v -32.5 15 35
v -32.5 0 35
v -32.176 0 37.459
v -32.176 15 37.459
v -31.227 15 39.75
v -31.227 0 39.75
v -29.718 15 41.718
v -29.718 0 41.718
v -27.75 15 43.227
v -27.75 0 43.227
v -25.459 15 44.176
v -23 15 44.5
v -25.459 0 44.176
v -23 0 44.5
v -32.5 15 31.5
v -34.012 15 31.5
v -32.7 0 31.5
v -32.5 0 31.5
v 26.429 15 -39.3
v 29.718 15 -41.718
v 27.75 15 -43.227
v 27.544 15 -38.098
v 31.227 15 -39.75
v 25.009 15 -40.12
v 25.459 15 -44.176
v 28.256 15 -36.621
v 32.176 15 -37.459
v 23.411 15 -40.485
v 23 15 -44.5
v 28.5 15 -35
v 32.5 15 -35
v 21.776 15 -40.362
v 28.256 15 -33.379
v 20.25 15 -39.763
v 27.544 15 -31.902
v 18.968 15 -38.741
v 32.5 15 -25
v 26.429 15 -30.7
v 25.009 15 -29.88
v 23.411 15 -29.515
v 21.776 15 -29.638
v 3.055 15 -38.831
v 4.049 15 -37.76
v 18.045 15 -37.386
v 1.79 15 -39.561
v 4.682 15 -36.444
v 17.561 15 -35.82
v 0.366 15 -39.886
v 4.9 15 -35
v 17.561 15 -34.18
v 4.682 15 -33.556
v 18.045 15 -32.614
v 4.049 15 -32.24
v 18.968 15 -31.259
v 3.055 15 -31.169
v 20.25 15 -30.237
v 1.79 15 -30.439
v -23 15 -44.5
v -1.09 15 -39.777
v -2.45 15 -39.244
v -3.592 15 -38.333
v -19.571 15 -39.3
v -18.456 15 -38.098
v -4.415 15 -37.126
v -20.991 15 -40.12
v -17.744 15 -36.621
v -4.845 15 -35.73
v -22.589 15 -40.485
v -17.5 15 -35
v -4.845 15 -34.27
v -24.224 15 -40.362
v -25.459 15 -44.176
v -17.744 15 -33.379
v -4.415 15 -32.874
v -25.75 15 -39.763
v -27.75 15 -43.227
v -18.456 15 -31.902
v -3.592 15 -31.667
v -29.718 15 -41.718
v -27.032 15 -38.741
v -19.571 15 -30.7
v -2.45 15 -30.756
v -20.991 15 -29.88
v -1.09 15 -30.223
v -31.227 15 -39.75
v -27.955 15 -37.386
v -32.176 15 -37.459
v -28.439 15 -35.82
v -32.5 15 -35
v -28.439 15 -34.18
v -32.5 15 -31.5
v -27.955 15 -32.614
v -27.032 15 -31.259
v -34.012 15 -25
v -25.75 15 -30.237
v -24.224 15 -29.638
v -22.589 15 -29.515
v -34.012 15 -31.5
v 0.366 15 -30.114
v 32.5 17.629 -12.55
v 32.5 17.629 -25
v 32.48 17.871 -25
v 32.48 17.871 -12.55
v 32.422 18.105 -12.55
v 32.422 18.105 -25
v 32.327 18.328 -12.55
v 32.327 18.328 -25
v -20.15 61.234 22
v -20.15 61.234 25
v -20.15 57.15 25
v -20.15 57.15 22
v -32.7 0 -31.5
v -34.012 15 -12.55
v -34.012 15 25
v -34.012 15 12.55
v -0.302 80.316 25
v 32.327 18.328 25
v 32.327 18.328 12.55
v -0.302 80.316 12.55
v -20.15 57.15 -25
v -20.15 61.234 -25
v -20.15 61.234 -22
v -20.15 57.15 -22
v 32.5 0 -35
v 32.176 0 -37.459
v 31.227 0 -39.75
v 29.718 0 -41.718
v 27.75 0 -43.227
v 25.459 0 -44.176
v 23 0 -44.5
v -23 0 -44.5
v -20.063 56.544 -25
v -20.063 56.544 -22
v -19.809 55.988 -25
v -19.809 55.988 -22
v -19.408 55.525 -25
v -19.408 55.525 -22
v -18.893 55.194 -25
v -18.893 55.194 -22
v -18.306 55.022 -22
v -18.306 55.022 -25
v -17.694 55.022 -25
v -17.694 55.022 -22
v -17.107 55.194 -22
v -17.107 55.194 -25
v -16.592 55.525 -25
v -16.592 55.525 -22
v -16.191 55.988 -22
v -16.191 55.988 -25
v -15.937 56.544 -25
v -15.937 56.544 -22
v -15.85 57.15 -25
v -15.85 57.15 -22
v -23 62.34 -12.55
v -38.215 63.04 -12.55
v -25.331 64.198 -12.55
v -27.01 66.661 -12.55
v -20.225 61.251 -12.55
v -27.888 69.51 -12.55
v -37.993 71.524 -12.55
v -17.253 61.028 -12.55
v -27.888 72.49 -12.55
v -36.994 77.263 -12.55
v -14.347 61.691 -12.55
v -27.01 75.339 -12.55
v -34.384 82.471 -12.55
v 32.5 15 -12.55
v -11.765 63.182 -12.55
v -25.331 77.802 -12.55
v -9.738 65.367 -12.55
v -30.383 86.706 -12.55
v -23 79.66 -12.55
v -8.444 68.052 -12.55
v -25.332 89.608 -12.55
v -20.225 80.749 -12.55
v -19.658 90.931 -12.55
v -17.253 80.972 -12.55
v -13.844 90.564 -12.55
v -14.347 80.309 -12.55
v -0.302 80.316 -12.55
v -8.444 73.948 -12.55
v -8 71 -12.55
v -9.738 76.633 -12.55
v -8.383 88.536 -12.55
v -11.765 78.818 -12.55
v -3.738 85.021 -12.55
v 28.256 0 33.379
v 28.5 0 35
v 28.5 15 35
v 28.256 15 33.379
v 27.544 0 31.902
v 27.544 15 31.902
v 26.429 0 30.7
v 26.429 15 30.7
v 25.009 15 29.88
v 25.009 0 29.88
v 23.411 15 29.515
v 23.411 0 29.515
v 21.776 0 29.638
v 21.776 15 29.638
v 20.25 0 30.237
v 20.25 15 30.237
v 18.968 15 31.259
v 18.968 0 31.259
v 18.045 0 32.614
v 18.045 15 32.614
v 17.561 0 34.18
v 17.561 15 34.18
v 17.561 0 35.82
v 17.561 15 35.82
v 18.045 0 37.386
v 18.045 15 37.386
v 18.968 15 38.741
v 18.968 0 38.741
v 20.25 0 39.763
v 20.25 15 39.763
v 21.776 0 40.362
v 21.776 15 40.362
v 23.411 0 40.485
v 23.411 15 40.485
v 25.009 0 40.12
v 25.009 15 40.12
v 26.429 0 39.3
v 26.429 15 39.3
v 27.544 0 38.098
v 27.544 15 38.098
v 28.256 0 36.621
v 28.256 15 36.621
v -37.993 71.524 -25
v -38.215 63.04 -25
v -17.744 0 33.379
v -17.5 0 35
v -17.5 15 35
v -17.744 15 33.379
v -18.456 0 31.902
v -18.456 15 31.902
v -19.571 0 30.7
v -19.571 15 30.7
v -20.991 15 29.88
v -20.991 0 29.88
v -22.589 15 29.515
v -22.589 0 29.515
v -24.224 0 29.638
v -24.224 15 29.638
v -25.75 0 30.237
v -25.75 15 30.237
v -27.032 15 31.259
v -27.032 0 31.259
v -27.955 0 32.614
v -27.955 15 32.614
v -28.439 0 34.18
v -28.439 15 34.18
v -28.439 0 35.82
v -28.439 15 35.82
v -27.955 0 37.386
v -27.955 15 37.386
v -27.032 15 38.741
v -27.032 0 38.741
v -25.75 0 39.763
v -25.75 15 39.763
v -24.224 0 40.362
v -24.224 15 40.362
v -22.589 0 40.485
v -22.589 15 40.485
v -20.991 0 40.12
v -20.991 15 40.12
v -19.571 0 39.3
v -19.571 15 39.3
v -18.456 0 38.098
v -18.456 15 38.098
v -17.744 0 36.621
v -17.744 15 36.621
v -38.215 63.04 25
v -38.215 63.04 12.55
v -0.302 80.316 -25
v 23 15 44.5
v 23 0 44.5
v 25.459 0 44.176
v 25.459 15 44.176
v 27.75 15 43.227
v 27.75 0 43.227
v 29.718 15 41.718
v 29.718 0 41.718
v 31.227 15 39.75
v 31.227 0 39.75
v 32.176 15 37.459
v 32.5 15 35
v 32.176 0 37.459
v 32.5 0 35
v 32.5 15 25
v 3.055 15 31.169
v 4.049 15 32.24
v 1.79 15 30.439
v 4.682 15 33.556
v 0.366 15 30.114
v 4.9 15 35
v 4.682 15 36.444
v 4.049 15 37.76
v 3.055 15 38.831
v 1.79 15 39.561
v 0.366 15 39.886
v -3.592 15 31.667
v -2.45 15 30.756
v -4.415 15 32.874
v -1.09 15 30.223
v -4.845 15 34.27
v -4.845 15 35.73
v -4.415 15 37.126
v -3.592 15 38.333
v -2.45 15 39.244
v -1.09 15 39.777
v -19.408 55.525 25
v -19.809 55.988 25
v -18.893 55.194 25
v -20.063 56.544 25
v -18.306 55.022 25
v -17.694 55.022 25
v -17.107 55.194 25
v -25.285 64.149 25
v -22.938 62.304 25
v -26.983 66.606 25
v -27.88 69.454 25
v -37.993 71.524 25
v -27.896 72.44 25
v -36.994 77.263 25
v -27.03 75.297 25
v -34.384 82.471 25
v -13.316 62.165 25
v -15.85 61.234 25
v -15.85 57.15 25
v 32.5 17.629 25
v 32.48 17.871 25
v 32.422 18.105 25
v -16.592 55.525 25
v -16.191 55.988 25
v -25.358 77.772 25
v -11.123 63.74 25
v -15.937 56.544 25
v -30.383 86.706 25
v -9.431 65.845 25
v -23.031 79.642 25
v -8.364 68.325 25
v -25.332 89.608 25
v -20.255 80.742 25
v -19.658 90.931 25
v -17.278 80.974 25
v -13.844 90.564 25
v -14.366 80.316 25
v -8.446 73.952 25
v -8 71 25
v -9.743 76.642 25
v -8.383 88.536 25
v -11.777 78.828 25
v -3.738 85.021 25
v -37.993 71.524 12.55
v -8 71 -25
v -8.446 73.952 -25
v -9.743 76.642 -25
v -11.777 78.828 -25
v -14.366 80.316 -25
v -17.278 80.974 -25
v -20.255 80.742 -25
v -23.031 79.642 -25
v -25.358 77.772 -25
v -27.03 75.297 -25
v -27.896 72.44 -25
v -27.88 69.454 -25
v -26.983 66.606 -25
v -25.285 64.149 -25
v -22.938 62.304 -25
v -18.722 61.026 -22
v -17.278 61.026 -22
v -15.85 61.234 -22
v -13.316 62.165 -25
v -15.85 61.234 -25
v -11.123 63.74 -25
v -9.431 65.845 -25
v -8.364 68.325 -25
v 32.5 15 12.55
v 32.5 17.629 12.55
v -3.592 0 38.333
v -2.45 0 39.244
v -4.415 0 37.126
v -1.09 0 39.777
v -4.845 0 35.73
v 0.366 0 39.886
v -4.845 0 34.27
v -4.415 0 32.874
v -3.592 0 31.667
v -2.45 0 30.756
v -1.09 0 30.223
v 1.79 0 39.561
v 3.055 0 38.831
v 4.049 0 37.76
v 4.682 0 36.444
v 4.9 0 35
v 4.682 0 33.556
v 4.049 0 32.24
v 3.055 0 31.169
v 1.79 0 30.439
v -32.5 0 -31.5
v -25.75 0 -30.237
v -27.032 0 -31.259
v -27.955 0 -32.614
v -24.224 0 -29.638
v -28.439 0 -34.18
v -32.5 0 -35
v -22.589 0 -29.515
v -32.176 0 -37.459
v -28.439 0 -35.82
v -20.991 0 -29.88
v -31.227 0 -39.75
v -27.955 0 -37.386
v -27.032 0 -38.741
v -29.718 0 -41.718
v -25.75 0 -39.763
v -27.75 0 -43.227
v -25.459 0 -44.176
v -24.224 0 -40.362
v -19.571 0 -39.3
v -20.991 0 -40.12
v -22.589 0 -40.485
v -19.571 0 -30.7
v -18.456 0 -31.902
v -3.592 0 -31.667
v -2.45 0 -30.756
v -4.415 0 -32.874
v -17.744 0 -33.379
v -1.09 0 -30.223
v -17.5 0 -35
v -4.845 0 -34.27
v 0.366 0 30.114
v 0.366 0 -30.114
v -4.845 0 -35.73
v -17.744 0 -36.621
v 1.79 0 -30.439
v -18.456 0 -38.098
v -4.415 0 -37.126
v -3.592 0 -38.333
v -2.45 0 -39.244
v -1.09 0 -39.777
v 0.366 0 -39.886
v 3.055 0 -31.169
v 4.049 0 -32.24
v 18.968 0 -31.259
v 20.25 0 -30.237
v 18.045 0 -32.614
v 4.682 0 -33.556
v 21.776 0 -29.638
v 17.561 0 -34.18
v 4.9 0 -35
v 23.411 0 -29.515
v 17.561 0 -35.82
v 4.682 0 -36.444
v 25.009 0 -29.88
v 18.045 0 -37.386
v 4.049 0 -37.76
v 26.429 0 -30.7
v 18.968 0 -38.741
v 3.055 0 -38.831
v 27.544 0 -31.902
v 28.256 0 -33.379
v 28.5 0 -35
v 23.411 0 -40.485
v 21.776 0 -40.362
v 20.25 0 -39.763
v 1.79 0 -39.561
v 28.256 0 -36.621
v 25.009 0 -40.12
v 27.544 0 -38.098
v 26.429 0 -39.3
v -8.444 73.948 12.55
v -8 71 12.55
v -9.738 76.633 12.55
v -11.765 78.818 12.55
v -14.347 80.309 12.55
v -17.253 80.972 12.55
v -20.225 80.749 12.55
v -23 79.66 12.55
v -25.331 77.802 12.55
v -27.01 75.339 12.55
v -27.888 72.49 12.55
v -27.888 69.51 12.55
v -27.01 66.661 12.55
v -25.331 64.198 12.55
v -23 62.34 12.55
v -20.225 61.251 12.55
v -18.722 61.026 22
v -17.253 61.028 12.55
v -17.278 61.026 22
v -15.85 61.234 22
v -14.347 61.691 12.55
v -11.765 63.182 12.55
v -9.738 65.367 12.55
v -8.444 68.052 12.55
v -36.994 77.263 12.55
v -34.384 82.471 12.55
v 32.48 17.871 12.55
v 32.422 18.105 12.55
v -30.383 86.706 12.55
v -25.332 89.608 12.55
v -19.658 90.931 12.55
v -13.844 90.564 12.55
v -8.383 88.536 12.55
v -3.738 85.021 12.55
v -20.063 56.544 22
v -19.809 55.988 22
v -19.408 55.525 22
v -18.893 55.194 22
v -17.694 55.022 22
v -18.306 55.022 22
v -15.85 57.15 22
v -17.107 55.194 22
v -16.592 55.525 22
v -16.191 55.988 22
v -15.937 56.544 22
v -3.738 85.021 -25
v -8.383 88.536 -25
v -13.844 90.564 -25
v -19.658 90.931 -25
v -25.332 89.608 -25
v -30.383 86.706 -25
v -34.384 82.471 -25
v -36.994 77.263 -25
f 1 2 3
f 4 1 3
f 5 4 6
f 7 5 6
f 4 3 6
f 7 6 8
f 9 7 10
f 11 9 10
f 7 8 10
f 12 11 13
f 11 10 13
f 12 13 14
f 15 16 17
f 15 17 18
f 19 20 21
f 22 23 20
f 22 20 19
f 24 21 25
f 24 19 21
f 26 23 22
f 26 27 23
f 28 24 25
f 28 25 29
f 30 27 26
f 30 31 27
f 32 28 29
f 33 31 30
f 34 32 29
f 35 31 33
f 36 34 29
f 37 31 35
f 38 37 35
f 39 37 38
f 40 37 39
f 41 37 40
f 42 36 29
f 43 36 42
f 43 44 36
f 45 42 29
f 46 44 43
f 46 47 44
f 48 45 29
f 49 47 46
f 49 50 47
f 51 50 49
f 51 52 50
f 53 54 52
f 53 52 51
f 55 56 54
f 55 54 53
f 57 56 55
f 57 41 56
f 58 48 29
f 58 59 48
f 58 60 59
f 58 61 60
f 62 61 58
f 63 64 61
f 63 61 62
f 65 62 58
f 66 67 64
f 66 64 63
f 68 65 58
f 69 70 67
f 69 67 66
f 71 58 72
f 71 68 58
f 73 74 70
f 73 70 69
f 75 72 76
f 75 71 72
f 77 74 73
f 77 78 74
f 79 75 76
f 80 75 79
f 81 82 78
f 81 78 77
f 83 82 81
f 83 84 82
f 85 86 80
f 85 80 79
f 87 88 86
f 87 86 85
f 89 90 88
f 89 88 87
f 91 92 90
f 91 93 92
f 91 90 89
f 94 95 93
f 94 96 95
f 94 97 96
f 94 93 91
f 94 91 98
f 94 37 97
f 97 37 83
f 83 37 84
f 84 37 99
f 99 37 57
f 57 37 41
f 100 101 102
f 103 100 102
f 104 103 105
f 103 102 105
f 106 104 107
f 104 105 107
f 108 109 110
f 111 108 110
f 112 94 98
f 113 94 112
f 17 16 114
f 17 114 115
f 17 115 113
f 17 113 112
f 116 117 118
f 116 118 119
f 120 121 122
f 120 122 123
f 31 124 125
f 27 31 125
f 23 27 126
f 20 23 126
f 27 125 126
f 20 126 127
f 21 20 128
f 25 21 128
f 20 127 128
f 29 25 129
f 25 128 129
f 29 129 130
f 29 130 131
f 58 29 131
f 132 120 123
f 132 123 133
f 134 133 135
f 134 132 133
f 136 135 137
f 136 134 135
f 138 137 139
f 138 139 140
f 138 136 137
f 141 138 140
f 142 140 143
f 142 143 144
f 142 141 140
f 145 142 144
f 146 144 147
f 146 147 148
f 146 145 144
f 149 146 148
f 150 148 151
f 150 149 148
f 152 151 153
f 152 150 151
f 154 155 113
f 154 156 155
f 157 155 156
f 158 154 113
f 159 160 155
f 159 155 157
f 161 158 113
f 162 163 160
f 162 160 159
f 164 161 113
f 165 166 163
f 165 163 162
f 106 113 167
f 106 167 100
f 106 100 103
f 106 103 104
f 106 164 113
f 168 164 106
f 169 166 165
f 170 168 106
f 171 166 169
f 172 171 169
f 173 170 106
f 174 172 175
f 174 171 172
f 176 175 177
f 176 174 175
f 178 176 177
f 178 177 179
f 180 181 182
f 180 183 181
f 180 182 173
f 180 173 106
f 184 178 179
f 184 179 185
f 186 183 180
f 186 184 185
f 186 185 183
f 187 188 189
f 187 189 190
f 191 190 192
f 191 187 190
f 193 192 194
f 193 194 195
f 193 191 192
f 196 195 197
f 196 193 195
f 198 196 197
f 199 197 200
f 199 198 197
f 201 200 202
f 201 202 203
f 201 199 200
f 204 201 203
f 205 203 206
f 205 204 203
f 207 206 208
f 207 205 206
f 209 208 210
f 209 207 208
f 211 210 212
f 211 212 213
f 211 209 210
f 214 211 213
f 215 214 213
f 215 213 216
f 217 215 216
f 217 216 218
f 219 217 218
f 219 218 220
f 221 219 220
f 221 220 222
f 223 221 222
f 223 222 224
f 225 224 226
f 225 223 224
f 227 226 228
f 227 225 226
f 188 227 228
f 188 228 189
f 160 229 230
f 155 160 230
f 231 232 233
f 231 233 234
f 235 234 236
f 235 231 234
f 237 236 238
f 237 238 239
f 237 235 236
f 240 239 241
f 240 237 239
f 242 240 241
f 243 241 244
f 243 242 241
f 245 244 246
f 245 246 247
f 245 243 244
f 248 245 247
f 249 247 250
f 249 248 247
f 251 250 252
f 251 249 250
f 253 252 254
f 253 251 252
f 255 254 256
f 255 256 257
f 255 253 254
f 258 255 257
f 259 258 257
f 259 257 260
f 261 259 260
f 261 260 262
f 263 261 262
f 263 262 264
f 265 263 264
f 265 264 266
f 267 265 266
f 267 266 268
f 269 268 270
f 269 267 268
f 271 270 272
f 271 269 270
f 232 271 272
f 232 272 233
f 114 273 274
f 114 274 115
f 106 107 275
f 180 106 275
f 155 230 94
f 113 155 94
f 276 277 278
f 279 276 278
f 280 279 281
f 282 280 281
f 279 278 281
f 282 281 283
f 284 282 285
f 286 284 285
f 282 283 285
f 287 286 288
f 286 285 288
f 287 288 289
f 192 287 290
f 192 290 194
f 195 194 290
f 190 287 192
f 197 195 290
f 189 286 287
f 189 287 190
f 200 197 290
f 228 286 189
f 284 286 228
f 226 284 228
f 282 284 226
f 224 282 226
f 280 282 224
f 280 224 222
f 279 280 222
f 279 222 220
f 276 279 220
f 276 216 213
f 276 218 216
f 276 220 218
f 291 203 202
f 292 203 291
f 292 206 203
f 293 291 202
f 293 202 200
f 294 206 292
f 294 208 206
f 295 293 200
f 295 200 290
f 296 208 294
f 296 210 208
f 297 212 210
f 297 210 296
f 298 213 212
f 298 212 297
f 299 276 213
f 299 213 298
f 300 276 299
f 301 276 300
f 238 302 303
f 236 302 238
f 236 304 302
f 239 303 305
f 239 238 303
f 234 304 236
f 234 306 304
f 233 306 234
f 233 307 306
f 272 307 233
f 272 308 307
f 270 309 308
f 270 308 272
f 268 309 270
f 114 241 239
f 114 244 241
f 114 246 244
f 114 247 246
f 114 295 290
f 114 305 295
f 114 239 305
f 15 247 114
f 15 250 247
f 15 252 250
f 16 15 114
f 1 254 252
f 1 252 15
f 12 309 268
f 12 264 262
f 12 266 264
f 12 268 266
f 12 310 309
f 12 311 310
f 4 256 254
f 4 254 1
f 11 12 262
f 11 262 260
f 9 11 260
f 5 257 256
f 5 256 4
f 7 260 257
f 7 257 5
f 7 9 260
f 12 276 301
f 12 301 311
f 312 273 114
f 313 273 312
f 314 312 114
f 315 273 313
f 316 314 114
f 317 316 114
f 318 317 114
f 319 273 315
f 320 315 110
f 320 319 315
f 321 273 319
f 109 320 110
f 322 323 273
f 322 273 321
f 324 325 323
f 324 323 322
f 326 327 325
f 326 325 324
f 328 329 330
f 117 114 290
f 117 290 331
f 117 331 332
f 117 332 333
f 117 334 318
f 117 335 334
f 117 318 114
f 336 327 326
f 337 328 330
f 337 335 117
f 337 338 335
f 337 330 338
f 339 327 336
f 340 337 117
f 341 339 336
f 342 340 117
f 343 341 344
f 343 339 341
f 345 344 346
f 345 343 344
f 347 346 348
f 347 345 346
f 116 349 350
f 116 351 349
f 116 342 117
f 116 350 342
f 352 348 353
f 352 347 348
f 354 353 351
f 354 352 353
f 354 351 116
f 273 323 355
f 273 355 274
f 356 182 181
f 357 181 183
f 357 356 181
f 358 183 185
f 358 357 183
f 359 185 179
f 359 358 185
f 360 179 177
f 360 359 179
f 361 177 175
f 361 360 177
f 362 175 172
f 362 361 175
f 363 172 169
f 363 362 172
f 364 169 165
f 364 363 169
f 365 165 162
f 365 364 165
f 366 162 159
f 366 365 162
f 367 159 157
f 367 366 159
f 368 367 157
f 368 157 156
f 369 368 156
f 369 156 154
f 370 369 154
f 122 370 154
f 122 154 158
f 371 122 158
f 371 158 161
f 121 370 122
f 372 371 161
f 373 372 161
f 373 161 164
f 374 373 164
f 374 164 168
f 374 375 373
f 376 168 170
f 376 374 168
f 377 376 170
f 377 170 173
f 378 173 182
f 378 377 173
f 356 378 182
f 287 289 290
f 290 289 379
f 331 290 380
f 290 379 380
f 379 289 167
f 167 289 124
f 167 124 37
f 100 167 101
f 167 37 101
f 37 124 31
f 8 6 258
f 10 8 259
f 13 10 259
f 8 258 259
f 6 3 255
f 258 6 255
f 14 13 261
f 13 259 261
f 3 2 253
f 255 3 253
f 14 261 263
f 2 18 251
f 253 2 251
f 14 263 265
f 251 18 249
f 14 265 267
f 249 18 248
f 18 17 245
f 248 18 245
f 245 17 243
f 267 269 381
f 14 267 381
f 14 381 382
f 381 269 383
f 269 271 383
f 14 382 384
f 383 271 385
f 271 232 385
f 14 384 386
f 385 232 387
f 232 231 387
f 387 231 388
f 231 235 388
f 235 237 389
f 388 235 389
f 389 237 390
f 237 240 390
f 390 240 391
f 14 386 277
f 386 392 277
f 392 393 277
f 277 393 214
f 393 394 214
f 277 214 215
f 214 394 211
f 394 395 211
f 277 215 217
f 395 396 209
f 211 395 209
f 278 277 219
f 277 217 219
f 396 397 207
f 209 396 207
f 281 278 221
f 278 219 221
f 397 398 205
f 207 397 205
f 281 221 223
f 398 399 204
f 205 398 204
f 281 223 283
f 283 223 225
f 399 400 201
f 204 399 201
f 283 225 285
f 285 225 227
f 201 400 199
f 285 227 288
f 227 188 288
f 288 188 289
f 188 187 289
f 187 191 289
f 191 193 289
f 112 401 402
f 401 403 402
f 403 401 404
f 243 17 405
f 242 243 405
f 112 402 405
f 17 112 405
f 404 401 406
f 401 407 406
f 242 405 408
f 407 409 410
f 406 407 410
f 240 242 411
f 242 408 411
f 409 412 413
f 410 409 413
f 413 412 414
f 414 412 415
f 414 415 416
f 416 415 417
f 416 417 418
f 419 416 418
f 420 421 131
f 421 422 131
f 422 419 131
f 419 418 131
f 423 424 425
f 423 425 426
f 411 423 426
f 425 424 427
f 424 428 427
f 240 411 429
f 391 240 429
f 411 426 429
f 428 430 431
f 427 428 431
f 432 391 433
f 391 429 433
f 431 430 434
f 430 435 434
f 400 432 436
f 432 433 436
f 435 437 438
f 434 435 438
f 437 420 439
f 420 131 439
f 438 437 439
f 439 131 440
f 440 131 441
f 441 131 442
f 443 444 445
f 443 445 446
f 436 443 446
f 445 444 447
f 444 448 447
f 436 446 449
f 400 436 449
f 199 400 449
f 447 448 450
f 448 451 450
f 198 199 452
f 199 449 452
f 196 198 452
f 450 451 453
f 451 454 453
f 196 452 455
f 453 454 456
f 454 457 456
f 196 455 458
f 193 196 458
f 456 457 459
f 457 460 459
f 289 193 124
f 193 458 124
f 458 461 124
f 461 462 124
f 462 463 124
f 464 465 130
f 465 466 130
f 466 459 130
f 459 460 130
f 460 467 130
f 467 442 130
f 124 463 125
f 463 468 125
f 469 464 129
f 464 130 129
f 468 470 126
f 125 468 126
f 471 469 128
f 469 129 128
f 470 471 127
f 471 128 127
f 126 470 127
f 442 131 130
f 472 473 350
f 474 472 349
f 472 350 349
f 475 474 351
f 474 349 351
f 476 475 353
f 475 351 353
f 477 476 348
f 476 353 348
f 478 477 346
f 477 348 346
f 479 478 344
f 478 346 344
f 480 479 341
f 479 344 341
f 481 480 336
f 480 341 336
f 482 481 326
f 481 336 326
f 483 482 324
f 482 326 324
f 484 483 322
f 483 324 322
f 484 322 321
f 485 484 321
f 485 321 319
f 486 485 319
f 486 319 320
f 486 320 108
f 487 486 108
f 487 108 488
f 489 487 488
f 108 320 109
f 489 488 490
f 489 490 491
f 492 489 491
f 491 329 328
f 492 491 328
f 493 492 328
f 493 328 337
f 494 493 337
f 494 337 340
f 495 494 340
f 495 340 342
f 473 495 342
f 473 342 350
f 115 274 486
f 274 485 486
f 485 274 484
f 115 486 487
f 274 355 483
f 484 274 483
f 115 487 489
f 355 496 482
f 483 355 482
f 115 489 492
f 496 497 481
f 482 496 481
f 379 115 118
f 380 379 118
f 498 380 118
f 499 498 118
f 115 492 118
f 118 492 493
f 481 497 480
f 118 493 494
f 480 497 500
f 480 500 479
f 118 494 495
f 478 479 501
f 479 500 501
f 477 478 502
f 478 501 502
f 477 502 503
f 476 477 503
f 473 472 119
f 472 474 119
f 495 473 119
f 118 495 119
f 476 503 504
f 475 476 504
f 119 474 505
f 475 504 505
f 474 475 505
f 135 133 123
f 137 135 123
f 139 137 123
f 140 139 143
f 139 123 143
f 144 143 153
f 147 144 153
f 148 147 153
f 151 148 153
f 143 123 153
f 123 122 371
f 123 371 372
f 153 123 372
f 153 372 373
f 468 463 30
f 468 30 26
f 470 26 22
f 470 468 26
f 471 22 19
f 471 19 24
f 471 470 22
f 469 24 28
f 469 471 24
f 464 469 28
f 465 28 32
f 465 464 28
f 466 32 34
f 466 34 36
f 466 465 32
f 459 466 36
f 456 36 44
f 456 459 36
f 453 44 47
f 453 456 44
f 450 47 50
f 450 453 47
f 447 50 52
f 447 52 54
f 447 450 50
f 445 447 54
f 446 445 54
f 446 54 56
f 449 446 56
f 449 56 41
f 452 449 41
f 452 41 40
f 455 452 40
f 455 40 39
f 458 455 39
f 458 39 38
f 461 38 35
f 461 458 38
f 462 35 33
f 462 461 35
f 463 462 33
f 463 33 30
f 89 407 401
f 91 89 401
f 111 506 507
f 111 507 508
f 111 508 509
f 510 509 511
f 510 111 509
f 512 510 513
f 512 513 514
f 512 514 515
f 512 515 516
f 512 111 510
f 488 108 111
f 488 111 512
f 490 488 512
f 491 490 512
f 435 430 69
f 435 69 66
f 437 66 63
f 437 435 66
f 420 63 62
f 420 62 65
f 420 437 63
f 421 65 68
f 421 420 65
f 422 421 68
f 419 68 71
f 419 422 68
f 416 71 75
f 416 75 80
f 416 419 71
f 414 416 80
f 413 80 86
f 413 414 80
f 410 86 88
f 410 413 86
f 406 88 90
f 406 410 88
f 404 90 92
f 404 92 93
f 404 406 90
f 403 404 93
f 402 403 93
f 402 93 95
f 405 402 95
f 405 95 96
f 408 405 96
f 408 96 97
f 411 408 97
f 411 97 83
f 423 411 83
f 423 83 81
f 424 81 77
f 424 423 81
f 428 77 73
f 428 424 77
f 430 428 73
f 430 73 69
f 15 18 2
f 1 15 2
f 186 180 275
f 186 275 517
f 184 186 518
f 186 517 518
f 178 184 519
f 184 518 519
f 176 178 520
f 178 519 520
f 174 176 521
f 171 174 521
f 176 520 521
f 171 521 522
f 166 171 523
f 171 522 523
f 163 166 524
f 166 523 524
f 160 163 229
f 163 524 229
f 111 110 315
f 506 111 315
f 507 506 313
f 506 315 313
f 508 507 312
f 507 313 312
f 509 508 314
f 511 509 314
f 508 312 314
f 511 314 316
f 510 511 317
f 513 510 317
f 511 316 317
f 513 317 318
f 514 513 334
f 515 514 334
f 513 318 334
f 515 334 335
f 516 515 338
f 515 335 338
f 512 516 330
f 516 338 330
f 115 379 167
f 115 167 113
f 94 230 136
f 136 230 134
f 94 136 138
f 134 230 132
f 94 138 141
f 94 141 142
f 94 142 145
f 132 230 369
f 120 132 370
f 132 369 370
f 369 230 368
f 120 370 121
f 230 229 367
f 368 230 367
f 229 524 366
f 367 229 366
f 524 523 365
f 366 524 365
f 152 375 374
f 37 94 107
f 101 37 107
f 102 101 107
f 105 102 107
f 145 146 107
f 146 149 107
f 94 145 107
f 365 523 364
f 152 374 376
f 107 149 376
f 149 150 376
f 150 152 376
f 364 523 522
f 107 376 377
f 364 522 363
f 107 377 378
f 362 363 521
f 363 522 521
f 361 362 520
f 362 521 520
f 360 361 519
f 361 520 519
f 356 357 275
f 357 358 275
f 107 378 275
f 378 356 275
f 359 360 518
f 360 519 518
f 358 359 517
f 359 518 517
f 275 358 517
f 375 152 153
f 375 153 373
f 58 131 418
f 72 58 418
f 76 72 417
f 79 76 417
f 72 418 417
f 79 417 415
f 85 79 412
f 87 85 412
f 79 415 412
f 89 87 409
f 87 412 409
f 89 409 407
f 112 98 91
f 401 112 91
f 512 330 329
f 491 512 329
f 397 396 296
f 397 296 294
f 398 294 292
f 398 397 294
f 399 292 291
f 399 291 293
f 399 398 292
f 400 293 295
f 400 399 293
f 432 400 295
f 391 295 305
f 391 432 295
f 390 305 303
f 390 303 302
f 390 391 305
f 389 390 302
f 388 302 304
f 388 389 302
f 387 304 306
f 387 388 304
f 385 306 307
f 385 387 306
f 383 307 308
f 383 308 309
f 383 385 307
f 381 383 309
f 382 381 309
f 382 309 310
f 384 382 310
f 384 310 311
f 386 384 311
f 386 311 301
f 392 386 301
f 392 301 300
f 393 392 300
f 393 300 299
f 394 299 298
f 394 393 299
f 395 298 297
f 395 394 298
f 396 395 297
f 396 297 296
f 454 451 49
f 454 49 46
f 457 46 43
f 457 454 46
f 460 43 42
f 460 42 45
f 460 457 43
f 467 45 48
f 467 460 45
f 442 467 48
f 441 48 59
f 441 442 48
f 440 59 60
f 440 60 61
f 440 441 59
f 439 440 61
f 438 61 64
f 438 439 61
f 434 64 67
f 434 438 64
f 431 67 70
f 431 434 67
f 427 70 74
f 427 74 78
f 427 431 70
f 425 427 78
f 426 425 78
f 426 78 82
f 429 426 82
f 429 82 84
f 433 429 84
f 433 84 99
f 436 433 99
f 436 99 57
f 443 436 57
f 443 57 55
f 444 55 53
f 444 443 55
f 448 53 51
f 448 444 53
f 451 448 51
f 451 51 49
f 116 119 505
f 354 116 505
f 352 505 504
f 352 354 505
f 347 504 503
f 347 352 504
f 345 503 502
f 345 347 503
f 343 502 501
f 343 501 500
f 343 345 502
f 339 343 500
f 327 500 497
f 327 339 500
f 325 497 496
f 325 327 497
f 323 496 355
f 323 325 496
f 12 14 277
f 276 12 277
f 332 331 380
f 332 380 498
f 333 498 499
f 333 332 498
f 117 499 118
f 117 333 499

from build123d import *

# Parameters (mm, degrees)
SKETCH1_R                = 5.5
SKETCH1_R_2              = 4.9
BOSS_EXTRUDE1_DEPTH      = 15
BOSS_EXTRUDE2_DEPTH      = 31.5
BOSS_EXTRUDE2_DEPTH_BACK = 31.5
SKETCH3_R                = 10
BOSS_EXTRUDE3_DEPTH      = 12.45
SKETCH4_R                = 10
BOSS_EXTRUDE4_DEPTH      = 12.45
CUT_EXTRUDE1_DEPTH       = 3
CUT_EXTRUDE1_DEPTH_BACK  = 3
CUT_EXTRUDE2_DEPTH       = 3
CUT_EXTRUDE2_DEPTH_BACK  = 3


with BuildPart() as part:
    # Sketch1 → Boss-Extrude1 (new body)
    with BuildSketch(Plane(origin=(0, 0, 0), x_dir=(1, 0, 0), z_dir=(0, 1, 0))):
        with BuildLine():
            Line((-23, -44.5), (23, -44.5))
            ThreePointArc((23, -44.5), (29.717514421, -41.717514421), (32.5, -35))
            Line((32.5, -35), (32.5, 35))
            ThreePointArc((32.5, 35), (29.717514421, 41.717514421), (23, 44.5))
            Line((23, 44.5), (-23, 44.5))
            ThreePointArc((-23, 44.5), (-29.717514421, 41.717514421), (-32.5, 35))
            Line((-32.5, 35), (-32.5, -35))
            ThreePointArc((-32.5, -35), (-29.717514421, -41.717514421), (-23, -44.5))
        make_face()
        with Locations((23, 35)):
            Circle(SKETCH1_R, mode=Mode.SUBTRACT)
        with Locations((23, -35)):
            Circle(SKETCH1_R, mode=Mode.SUBTRACT)
        with Locations((0, 35)):
            Circle(SKETCH1_R_2, mode=Mode.SUBTRACT)
        with Locations((0, -35)):
            Circle(SKETCH1_R_2, mode=Mode.SUBTRACT)
        with Locations((-23, 35)):
            Circle(SKETCH1_R, mode=Mode.SUBTRACT)
        with Locations((-23, -35)):
            Circle(SKETCH1_R, mode=Mode.SUBTRACT)
    extrude(amount=BOSS_EXTRUDE1_DEPTH)

    # Sketch2 → Boss-Extrude2 (add, two sides)
    with BuildSketch(Plane.XY) as boss_extrude2_sk:
        Polygon((-34.012329953, 15), (-32.7, 0), (-27.7, 0), (-27.7, 15), align=None)
    extrude(amount=BOSS_EXTRUDE2_DEPTH)
    extrude(boss_extrude2_sk.sketch, amount=-BOSS_EXTRUDE2_DEPTH_BACK)

    # Sketch3 → Boss-Extrude3 (add)
    with BuildSketch(Plane.XY.offset(25)):
        with BuildLine():
            Line((-38.215293381, 63.040091813), (-32.7, 0))
            Line((-32.7, 0), (32.5, 0))
            Line((32.5, 0), (32.5, 17.62932037))
            ThreePointArc((32.5, 17.62932037), (32.456195267, 17.989174985), (32.327339541, 18.32801182))
            Line((32.327339541, 18.32801182), (-0.302139449, 80.315885997))
            ThreePointArc((-0.302139449, 80.315885997), (-22.543503711, 90.47707817), (-37.9931465, 71.523538966))
            Line((-37.9931465, 71.523538966), (-38.215293381, 63.040091813))
        make_face()
        with Locations((-18, 71)):
            Circle(SKETCH3_R, mode=Mode.SUBTRACT)
    extrude(amount=-BOSS_EXTRUDE3_DEPTH)

    # Sketch4 → Boss-Extrude4 (add)
    with BuildSketch(Plane.XY.offset(-25)):
        with BuildLine():
            Line((-38.215293381, 63.040091813), (-32.7, 0))
            Line((-32.7, 0), (32.5, 0))
            Line((32.5, 0), (32.5, 17.62932037))
            ThreePointArc((32.5, 17.62932037), (32.456195267, 17.989174985), (32.327339541, 18.32801182))
            Line((32.327339541, 18.32801182), (-0.302139449, 80.315885997))
            ThreePointArc((-0.302139449, 80.315885997), (-22.543503711, 90.47707817), (-37.9931465, 71.523538966))
            Line((-37.9931465, 71.523538966), (-38.215293381, 63.040091813))
        make_face()
        with Locations((-18, 71)):
            Circle(SKETCH4_R, mode=Mode.SUBTRACT)
    extrude(amount=BOSS_EXTRUDE4_DEPTH)

    # Sketch5 → Cut-Extrude1 (cut, two sides)
    with BuildSketch(Plane.XY.offset(25)) as cut_extrude1_sk:
        with BuildLine():
            Line((-15.85, 57.15), (-15.85, 71))
            Line((-15.85, 71), (-20.15, 71))
            Line((-20.15, 71), (-20.15, 57.15))
            ThreePointArc((-20.15, 57.15), (-18, 55), (-15.85, 57.15))
        make_face()
    extrude(amount=CUT_EXTRUDE1_DEPTH, mode=Mode.SUBTRACT)
    extrude(cut_extrude1_sk.sketch, amount=-CUT_EXTRUDE1_DEPTH_BACK, mode=Mode.SUBTRACT)

    # Sketch6 → Cut-Extrude2 (cut, two sides)
    with BuildSketch(Plane.XY.offset(-25)) as cut_extrude2_sk:
        with BuildLine():
            Line((-15.85, 57.15), (-15.85, 71))
            Line((-15.85, 71), (-20.15, 71))
            Line((-20.15, 71), (-20.15, 57.15))
            ThreePointArc((-20.15, 57.15), (-18, 55), (-15.85, 57.15))
        make_face()
    extrude(amount=CUT_EXTRUDE2_DEPTH, mode=Mode.SUBTRACT)
    extrude(cut_extrude2_sk.sketch, amount=-CUT_EXTRUDE2_DEPTH_BACK, mode=Mode.SUBTRACT)


solid = part.part
